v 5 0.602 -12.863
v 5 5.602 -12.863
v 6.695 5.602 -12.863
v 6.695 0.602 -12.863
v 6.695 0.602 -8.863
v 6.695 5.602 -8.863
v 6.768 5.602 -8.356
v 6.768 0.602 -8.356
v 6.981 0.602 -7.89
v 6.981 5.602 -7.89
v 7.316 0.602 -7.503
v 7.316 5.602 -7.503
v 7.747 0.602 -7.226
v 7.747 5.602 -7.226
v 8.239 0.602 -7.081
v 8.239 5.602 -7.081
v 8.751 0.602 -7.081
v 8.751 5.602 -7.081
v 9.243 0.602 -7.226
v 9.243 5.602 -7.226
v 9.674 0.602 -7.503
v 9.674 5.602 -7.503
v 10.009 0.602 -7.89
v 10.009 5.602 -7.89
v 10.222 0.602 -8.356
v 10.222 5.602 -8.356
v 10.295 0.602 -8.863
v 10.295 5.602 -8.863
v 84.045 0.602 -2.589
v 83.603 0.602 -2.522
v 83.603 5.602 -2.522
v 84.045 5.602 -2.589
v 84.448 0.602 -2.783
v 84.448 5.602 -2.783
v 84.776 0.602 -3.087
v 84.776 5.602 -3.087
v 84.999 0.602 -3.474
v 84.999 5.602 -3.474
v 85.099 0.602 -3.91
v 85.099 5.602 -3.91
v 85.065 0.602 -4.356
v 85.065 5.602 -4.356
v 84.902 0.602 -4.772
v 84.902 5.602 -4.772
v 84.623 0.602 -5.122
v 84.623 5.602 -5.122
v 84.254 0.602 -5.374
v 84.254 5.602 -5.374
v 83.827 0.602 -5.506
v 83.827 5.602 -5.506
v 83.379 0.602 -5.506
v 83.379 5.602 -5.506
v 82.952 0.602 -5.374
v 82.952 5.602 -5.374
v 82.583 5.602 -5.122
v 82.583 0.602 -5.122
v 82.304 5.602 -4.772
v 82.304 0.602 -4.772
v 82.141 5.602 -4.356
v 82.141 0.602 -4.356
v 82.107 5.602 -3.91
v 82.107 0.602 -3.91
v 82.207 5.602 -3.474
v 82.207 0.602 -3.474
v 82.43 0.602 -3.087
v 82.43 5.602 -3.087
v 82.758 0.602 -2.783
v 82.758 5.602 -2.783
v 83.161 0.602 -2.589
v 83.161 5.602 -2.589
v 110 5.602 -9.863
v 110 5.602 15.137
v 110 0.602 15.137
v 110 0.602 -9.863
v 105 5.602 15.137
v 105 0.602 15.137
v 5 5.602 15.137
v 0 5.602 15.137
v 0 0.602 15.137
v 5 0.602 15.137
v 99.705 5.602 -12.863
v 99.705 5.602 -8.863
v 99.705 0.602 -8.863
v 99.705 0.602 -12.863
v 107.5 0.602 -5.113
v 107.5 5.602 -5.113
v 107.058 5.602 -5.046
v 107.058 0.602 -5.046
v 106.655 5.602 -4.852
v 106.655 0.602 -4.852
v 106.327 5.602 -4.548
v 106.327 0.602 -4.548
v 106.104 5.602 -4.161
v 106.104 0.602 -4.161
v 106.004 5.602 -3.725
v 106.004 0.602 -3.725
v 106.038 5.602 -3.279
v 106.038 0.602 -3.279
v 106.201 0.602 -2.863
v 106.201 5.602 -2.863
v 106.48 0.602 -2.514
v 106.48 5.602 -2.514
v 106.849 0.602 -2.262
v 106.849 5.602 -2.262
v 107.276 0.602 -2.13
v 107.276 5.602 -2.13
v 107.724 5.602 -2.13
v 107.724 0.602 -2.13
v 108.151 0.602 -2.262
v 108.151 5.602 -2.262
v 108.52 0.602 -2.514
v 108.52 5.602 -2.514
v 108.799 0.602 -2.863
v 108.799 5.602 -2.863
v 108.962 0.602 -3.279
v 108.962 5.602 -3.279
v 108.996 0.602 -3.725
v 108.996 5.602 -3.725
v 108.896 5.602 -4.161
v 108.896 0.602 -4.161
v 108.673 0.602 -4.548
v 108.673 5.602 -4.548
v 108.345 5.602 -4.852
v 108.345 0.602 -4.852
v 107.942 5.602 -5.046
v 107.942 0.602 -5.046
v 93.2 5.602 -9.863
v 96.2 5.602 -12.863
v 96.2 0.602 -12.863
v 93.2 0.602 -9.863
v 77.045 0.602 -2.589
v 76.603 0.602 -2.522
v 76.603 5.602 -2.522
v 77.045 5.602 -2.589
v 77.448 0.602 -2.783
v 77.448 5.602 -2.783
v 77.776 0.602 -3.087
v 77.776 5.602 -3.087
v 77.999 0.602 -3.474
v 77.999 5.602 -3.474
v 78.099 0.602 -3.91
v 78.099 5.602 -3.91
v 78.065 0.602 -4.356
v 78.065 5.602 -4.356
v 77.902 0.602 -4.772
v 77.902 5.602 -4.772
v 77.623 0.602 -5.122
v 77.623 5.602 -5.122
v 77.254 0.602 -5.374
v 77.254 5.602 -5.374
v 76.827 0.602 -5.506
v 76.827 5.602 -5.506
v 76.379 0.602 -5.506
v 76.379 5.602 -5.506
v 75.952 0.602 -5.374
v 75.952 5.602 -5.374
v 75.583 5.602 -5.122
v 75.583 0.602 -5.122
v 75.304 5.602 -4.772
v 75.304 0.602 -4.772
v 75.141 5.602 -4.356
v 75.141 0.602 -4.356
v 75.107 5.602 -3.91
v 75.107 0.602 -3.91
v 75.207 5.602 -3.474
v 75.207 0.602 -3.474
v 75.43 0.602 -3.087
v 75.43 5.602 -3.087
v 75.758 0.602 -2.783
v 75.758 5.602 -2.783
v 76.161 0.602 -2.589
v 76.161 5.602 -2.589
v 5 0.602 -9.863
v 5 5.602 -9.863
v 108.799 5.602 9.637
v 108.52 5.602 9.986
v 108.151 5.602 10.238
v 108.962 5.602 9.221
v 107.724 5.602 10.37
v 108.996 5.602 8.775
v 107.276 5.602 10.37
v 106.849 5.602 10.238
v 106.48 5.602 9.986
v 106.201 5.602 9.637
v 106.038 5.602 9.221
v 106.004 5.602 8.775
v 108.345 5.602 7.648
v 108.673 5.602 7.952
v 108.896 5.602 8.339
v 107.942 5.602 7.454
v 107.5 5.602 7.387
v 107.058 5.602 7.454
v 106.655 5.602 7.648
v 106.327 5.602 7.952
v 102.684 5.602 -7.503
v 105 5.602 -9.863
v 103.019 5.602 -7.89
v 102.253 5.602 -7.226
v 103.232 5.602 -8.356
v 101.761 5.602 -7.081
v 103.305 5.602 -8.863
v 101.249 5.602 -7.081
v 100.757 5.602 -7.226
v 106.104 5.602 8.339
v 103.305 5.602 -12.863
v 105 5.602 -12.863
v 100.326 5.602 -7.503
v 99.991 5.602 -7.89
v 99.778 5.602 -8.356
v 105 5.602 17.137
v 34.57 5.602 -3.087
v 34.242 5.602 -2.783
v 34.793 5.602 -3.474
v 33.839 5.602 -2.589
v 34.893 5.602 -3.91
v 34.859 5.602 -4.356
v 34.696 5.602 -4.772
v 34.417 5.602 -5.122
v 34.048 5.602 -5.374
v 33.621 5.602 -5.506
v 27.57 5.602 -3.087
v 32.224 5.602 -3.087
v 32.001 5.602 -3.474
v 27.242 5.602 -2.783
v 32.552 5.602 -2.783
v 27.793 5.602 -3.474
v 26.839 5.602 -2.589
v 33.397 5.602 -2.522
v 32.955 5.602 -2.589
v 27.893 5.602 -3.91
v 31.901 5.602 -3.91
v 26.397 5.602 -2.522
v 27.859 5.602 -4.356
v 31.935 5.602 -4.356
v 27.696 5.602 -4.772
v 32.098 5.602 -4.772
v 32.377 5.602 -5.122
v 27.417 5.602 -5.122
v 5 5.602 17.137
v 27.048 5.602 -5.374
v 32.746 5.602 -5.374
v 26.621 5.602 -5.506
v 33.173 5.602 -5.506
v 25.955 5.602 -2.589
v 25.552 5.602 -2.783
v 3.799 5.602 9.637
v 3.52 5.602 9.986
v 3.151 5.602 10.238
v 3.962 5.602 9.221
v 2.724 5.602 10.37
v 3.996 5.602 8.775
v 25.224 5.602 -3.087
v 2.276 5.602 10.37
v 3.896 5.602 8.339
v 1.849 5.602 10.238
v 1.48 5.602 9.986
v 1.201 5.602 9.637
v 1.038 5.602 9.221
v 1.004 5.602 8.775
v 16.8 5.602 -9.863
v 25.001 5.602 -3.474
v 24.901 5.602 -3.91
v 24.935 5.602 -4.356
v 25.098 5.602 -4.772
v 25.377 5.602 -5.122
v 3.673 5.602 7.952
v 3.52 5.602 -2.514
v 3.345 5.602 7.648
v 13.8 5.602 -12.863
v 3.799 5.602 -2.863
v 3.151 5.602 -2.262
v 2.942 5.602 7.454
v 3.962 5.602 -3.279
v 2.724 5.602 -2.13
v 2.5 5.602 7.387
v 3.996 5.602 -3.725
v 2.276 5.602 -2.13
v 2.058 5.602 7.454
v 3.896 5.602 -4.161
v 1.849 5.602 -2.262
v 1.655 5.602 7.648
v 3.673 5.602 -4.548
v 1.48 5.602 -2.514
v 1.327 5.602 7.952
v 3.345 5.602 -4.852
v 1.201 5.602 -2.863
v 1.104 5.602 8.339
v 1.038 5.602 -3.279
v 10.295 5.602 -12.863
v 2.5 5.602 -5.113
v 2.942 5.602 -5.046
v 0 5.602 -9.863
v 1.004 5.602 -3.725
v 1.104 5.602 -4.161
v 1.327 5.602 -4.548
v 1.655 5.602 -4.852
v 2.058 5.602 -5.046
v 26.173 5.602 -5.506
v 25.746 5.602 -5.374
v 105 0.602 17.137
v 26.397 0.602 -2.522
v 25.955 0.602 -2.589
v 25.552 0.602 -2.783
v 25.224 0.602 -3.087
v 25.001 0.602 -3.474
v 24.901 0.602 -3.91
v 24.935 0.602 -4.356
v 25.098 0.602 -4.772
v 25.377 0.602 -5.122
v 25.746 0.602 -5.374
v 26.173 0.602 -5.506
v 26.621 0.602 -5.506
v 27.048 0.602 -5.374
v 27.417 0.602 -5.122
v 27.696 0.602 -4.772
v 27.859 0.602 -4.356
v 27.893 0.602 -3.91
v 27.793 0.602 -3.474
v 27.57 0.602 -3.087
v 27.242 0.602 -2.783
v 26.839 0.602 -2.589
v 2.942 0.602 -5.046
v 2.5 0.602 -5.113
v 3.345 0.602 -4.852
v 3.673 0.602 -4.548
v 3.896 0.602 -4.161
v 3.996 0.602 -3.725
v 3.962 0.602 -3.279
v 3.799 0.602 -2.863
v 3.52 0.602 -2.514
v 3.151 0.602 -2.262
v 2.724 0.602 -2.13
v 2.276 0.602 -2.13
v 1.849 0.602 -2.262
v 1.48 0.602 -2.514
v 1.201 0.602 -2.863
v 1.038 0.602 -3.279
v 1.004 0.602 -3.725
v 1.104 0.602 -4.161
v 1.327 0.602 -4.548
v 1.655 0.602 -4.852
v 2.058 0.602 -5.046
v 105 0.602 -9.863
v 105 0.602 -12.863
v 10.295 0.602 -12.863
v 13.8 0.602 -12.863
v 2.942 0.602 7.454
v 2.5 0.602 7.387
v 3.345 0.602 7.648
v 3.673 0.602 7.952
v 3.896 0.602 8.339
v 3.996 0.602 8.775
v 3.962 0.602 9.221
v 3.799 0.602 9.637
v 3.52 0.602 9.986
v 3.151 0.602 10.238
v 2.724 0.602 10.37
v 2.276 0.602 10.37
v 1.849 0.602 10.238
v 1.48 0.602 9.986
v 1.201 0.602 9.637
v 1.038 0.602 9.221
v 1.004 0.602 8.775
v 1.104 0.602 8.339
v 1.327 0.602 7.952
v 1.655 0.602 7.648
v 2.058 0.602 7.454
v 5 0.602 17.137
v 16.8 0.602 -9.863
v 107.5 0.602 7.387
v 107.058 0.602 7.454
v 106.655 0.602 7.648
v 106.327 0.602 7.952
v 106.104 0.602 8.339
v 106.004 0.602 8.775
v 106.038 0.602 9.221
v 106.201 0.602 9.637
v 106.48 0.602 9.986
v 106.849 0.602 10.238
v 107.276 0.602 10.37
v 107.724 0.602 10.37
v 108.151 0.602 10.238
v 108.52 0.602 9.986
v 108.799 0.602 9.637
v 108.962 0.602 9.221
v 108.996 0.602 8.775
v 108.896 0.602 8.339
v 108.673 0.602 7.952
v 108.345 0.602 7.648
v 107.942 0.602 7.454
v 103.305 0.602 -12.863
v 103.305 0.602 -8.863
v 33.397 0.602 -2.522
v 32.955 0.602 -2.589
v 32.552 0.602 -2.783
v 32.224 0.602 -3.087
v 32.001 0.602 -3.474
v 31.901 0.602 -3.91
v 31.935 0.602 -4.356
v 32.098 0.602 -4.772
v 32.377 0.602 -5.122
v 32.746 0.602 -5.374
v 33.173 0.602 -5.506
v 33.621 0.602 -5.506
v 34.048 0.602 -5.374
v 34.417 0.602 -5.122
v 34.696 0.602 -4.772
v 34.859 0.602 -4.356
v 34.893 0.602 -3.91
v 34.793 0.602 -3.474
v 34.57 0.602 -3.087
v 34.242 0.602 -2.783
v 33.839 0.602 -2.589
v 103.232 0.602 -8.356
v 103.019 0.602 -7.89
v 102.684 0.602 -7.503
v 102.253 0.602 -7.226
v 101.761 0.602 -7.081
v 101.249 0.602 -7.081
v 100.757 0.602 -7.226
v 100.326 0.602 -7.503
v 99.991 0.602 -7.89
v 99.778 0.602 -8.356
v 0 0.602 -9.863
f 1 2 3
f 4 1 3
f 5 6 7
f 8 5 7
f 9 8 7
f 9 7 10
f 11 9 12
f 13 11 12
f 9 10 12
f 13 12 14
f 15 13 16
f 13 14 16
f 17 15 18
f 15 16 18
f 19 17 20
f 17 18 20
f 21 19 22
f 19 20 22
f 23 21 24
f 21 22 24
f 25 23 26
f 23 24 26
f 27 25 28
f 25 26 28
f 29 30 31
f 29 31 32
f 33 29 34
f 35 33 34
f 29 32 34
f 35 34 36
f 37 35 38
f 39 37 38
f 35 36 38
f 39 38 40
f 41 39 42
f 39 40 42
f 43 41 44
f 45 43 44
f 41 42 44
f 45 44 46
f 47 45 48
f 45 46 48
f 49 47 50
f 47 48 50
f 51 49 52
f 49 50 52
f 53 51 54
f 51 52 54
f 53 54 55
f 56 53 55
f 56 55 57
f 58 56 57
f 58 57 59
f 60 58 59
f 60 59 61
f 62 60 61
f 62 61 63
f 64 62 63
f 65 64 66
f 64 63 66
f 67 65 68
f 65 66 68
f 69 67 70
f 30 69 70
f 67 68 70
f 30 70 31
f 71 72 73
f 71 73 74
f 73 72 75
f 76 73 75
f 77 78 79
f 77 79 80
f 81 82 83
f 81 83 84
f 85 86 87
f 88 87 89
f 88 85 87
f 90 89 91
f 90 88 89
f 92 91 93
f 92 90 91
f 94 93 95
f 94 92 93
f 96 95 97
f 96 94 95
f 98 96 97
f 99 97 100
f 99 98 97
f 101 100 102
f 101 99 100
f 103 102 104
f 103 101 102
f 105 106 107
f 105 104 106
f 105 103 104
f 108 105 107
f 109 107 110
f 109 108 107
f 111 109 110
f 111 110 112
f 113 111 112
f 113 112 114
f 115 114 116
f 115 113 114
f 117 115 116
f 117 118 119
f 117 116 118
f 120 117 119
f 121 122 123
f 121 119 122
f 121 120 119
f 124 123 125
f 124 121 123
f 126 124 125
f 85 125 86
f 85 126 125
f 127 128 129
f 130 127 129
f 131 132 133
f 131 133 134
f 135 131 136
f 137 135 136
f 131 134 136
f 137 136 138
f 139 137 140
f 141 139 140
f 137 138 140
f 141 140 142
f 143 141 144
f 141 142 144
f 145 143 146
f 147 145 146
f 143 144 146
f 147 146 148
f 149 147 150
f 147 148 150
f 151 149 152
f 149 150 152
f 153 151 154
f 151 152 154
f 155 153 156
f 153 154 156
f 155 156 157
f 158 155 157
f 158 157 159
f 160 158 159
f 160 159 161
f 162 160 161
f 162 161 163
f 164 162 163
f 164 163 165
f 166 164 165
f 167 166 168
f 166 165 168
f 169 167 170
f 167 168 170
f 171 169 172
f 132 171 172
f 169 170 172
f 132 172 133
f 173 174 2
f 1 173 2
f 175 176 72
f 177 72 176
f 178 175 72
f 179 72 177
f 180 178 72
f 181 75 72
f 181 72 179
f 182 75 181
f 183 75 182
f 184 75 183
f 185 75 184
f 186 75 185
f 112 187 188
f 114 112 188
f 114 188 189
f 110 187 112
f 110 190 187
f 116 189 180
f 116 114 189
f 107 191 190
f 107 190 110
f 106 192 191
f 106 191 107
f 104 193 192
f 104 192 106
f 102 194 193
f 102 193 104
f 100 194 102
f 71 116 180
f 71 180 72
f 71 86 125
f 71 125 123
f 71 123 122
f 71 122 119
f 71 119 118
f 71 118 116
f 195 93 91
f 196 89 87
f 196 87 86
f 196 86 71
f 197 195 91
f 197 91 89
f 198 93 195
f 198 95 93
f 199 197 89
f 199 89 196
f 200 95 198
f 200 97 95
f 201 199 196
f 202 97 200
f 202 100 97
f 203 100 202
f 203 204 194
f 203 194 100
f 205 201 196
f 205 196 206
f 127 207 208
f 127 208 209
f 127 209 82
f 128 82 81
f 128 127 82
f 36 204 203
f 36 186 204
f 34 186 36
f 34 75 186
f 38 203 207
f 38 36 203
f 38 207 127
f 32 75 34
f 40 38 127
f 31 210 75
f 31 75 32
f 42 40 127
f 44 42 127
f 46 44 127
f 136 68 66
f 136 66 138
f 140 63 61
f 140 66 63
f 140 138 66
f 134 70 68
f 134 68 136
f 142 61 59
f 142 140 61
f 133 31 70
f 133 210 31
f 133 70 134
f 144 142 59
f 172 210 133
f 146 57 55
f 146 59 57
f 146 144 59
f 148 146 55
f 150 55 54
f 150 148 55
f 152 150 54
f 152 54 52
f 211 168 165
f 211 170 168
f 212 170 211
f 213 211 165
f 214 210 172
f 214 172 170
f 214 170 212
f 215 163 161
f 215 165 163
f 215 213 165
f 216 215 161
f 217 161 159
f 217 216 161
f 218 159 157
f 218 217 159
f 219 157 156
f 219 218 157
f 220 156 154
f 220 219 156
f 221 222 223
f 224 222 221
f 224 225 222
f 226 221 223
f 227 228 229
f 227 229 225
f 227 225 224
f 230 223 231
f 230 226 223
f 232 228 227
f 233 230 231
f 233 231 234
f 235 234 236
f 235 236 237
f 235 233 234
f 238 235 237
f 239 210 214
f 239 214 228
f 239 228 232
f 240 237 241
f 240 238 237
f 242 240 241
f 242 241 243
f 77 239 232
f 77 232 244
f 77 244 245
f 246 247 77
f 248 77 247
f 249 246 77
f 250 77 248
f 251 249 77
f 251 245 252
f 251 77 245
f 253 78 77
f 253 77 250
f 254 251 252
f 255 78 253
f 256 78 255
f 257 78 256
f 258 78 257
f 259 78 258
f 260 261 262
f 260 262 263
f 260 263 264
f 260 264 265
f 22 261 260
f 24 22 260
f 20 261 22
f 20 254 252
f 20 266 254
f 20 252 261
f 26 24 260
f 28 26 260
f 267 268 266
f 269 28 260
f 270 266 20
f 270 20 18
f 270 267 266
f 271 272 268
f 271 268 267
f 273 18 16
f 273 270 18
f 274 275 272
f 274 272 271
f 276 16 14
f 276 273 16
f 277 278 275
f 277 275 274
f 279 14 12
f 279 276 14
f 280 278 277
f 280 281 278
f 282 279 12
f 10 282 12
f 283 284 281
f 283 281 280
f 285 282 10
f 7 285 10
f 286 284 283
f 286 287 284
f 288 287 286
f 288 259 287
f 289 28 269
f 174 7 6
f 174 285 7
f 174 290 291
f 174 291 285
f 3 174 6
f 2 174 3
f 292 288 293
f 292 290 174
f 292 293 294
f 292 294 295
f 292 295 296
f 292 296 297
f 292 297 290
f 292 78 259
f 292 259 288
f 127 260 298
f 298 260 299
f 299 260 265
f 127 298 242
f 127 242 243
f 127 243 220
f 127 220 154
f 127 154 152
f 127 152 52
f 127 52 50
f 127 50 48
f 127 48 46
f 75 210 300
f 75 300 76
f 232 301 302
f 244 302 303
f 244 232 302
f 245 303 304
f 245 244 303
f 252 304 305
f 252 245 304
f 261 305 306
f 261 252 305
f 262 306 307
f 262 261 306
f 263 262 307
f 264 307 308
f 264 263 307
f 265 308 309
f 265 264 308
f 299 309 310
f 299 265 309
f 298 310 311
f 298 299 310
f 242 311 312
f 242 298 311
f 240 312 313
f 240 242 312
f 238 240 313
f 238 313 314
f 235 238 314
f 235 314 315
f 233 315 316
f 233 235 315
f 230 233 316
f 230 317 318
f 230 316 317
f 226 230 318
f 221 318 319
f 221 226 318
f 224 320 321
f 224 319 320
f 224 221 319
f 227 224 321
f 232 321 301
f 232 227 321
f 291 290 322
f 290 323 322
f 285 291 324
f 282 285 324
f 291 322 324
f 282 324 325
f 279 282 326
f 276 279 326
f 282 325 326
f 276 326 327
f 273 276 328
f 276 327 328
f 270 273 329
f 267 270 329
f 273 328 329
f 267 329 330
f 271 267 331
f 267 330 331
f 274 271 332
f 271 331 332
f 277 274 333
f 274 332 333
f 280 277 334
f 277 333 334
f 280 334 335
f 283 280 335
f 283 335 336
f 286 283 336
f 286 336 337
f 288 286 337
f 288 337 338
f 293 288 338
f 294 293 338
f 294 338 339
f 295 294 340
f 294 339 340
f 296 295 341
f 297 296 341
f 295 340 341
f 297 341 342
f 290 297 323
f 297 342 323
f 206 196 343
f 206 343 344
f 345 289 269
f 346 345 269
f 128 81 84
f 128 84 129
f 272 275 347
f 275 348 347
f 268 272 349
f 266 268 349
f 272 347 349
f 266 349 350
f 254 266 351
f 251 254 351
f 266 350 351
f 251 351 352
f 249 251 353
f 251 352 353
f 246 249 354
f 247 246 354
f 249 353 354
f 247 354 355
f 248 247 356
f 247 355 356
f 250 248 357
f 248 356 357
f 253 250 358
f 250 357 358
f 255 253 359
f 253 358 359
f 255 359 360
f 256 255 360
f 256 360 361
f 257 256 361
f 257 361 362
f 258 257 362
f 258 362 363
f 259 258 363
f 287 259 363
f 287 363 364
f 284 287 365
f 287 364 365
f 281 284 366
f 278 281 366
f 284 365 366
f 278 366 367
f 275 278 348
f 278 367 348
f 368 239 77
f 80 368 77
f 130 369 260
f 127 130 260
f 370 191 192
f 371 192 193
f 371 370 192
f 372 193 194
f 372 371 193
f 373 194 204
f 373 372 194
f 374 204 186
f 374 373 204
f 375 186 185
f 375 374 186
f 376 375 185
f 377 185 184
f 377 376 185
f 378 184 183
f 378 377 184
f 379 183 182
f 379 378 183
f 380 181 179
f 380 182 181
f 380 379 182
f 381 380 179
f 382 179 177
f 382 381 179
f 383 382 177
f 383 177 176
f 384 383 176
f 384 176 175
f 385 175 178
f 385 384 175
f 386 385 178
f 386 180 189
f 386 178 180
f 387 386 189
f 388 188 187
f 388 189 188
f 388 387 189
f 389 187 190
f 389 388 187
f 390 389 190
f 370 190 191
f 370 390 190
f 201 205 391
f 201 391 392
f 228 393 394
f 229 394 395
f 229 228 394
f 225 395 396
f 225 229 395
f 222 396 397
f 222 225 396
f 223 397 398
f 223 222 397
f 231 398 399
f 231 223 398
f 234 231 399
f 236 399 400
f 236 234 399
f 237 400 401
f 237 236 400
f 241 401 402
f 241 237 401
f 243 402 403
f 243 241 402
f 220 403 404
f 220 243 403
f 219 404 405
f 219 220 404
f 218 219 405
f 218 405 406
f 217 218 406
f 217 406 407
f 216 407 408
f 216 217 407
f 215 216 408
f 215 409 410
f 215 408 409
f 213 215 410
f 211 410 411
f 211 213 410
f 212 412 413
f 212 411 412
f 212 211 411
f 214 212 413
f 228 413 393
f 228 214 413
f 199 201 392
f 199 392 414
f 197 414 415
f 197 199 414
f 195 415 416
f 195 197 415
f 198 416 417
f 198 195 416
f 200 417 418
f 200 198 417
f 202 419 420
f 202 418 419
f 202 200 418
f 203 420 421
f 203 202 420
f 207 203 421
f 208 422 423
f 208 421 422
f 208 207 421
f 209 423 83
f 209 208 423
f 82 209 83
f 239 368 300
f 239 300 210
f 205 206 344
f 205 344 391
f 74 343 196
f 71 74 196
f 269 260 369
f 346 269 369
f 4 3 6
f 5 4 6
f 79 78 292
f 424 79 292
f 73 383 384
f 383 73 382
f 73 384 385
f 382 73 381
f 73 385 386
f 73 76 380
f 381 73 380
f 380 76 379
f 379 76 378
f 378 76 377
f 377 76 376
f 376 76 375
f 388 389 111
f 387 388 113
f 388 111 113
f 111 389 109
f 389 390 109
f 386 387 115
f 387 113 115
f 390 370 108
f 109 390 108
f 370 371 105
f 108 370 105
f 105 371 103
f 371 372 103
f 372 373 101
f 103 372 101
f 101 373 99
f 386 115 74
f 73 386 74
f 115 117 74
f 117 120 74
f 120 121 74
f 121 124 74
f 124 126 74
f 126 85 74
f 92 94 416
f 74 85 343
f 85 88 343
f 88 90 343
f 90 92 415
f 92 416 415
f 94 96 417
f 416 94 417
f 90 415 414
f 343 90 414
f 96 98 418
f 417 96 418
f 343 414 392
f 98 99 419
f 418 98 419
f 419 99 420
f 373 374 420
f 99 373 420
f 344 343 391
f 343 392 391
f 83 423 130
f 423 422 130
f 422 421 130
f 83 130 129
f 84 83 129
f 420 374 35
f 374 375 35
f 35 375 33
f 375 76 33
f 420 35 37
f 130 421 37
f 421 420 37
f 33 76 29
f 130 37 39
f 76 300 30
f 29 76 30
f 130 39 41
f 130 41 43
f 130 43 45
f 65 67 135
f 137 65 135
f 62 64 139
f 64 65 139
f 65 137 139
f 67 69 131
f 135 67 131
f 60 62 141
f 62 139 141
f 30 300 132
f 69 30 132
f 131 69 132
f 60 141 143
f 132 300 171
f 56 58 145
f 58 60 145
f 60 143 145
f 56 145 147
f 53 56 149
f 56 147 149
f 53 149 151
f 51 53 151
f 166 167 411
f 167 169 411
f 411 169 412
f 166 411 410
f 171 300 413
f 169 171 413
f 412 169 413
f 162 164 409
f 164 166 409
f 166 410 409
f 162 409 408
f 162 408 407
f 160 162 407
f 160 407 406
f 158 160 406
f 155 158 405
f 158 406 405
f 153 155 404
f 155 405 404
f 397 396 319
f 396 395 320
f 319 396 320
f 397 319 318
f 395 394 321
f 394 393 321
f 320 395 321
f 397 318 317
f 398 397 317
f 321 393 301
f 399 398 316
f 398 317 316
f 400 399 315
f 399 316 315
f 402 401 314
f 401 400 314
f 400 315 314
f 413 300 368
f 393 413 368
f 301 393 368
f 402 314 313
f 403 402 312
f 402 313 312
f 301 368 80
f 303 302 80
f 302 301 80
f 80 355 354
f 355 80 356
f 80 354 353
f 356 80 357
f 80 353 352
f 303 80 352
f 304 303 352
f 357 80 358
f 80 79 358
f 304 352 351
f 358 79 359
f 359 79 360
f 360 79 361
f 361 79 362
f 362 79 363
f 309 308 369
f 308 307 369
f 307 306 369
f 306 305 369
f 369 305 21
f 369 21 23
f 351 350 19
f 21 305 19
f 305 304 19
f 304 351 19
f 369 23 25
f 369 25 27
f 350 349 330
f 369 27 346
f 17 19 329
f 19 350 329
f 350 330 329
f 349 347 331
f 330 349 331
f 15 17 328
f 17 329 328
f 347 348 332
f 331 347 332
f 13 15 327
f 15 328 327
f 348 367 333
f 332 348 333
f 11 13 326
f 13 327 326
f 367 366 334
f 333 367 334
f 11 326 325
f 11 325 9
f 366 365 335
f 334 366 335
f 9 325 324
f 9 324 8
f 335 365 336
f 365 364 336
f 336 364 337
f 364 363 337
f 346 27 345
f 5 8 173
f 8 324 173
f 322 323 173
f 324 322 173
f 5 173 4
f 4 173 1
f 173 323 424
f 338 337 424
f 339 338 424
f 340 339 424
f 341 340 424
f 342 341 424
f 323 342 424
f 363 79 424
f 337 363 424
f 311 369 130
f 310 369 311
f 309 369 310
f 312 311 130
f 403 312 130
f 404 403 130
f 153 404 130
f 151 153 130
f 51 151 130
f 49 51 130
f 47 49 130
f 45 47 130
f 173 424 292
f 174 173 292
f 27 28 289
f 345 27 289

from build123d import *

# Parameters (mm, degrees)
SKETCH1_W                      = 27
SKETCH1_H                      = 5
BOSS_EXTRUDE1_DEPTH            = 110
M3_TAPPED_HOLE1_AT_2_COUNT     = 2
M3_TAPPED_HOLE1_AT_2_PITCH     = 7
SKETCH6_W                      = 5
SKETCH6_H                      = 2
CUT_EXTRUDE1_DEPTH             = 10
BOSS_EXTRUDE2_DEPTH            = 5
CUT_EXTRUDE3_DEPTH             = 10
CHAMFER1_SIZE                  = 3
CHAMFER1_OF_MIRROR8_SIZE       = 3
F_3_0MM_DOWEL_HOLE1_AT_2_COUNT = 2
F_3_0MM_DOWEL_HOLE1_AT_2_PITCH = 12.5


with BuildPart() as part:
    # Sketch1 → Boss-Extrude1 (new body)
    with BuildSketch(Plane(origin=(0, 0, 0), x_dir=(0, 0, -1), z_dir=(1, 0, 0))):
        with Locations((-3.636889684, 3.101965352)):
            Rectangle(SKETCH1_W, SKETCH1_H)
    extrude(amount=BOSS_EXTRUDE1_DEPTH)

    # Sketch14 → M3 Tapped Hole1 (revolve, cut)
    with BuildSketch(Plane(origin=(26.397029049, 5.601965352, -4.022332737), x_dir=(0, 0, 1), z_dir=(1, 0, 0))):
        Polygon((0, 0), (0, 8.251075774), (1.25, 7.5), (1.25, 6), (1.5, 6), (1.5, 0), align=None)
    m3_tapped_hole1 = revolve(axis=Axis((26.397029049, 11.951965352, -4.022332737), (0, -1, 0)), mode=Mode.SUBTRACT)

    # M3 Tapped Hole1 at 2: M3 Tapped Hole1 ×2
    with Locations(*[(i * M3_TAPPED_HOLE1_AT_2_PITCH, 0, 0) for i in range(1, M3_TAPPED_HOLE1_AT_2_COUNT)]):
        add(m3_tapped_hole1, mode=Mode.SUBTRACT)

    # Mirror3: M3 Tapped Hole1 across plane
    add(m3_tapped_hole1.mirror(Plane(origin=(55, 0, 0), x_dir=(0, 0, 1), z_dir=(1, 0, 0))), mode=Mode.SUBTRACT)

    # Mirror3 copy 1 sketch → Mirror3 copy 1 (revolve, cut)
    with BuildSketch(Plane(origin=(76.602970951, 5.601965352, -4.022332737), x_dir=(0, 0, 1), z_dir=(-1, 0, 0))):
        Polygon((0, 0), (0, -8.251075774), (1.25, -7.5), (1.25, -6), (1.5, -6), (1.5, 0), align=None)
    revolve(axis=Axis((76.602970951, 11.951965352, -4.022332737), (0, 1, 0)), mode=Mode.SUBTRACT)

    # Sketch6 → Cut-Extrude1 (cut)
    with BuildSketch(Plane(origin=(0, 5.601965352, 0), x_dir=(1, 0, 0), z_dir=(0, 1, 0))):
        with Locations((2.5, -16.136889684)):
            Rectangle(SKETCH6_W, SKETCH6_H)
    cut_extrude1 = extrude(amount=-CUT_EXTRUDE1_DEPTH, mode=Mode.SUBTRACT)

    # Mirror4: Cut-Extrude1 across plane
    add(cut_extrude1.mirror(Plane(origin=(55, 0, 0), x_dir=(0, 0, 1), z_dir=(1, 0, 0))), mode=Mode.SUBTRACT)

    # Sketch17 → Boss-Extrude2 (add)
    with BuildSketch(Plane(origin=(0, 5.601965352, 0), x_dir=(1, 0, 0), z_dir=(0, 1, 0))):
        Polygon((105, 9.863110316), (105, 12.863110316), (103.25, 12.863110316), (99.674047562, 12.863110316), (93.200232163, 12.863110316), (93.200232163, 9.863110316), (97.924047562, 9.863110316), align=None)
    boss_extrude2 = extrude(amount=-BOSS_EXTRUDE2_DEPTH)

    # Sketch22 → Cut-Extrude3 (cut)
    with BuildSketch(Plane(origin=(0, 5.601965352, 0), x_dir=(1, 0, 0), z_dir=(0, 1, 0))):
        with BuildLine():
            Line((101.505065332, 12.863110316), (103.305065332, 12.863110316))
            Line((103.305065332, 12.863110316), (103.305065332, 8.863110316))
            ThreePointArc((103.305065332, 8.863110316), (101.505065332, 7.063110316), (99.705065332, 8.863110316))
            Line((99.705065332, 8.863110316), (99.705065332, 12.863110316))
            Line((99.705065332, 12.863110316), (101.505065332, 12.863110316))
        make_face()
    cut_extrude3 = extrude(amount=-CUT_EXTRUDE3_DEPTH, mode=Mode.SUBTRACT)

    # Chamfer1
    chamfer1_edges = [part.edges().sort_by_distance(p)[0] for p in [
        (93.200232163, 3.101965352, -12.863110316),
    ]]
    chamfer(chamfer1_edges, length=CHAMFER1_SIZE - 0.0001)  # a hair under: the kernel refuses the full size

    # Mirror8: Boss-Extrude2, Cut-Extrude3 across plane
    add(boss_extrude2.mirror(Plane.ZY.offset(-55)))
    add(cut_extrude3.mirror(Plane.ZY.offset(-55)), mode=Mode.SUBTRACT)

    # Chamfer1 of Mirror8
    chamfer1_of_mirror8_edges = [part.edges().sort_by_distance(p)[0] for p in [
        (16.799767837, 3.101965352, -12.863110316),
    ]]
    chamfer(chamfer1_of_mirror8_edges, length=CHAMFER1_OF_MIRROR8_SIZE - 0.0001)  # a hair under: the kernel refuses the full size

    # Sketch24 → Ø3.0mm Dowel Hole1 (revolve, cut)
    with BuildSketch(Plane(origin=(107.5, 0.601965352, -3.613110316), x_dir=(0, 0, -1), z_dir=(1, 0, 0))):
        Polygon((0, 0), (0, 20.901290929), (1.5, 20), (1.5, 0), align=None)
    f_3_0mm_dowel_hole1 = revolve(axis=Axis((107.5, -5.748034648, -3.613110316), (0, 1, 0)), mode=Mode.SUBTRACT)

    # Ø3.0mm Dowel Hole1 at 2: Ø3.0mm Dowel Hole1 ×2
    with Locations(*[(0, 0, i * F_3_0MM_DOWEL_HOLE1_AT_2_PITCH) for i in range(1, F_3_0MM_DOWEL_HOLE1_AT_2_COUNT)]):
        add(f_3_0mm_dowel_hole1, mode=Mode.SUBTRACT)

    # Mirror9: Ø3.0mm Dowel Hole1 across plane
    add(f_3_0mm_dowel_hole1.mirror(Plane.ZY.offset(-55)), mode=Mode.SUBTRACT)

    # Mirror9 copy 1 sketch → Mirror9 copy 1 (revolve, cut)
    with BuildSketch(Plane(origin=(2.5, 0.601965352, 8.886889684), x_dir=(0, 0, -1), z_dir=(-1, 0, 0))):
        Polygon((0, 0), (0, -20.901290929), (1.5, -20), (1.5, 0), align=None)
    revolve(axis=Axis((2.5, -5.748034648, 8.886889684), (0, -1, 0)), mode=Mode.SUBTRACT)


solid = part.part
